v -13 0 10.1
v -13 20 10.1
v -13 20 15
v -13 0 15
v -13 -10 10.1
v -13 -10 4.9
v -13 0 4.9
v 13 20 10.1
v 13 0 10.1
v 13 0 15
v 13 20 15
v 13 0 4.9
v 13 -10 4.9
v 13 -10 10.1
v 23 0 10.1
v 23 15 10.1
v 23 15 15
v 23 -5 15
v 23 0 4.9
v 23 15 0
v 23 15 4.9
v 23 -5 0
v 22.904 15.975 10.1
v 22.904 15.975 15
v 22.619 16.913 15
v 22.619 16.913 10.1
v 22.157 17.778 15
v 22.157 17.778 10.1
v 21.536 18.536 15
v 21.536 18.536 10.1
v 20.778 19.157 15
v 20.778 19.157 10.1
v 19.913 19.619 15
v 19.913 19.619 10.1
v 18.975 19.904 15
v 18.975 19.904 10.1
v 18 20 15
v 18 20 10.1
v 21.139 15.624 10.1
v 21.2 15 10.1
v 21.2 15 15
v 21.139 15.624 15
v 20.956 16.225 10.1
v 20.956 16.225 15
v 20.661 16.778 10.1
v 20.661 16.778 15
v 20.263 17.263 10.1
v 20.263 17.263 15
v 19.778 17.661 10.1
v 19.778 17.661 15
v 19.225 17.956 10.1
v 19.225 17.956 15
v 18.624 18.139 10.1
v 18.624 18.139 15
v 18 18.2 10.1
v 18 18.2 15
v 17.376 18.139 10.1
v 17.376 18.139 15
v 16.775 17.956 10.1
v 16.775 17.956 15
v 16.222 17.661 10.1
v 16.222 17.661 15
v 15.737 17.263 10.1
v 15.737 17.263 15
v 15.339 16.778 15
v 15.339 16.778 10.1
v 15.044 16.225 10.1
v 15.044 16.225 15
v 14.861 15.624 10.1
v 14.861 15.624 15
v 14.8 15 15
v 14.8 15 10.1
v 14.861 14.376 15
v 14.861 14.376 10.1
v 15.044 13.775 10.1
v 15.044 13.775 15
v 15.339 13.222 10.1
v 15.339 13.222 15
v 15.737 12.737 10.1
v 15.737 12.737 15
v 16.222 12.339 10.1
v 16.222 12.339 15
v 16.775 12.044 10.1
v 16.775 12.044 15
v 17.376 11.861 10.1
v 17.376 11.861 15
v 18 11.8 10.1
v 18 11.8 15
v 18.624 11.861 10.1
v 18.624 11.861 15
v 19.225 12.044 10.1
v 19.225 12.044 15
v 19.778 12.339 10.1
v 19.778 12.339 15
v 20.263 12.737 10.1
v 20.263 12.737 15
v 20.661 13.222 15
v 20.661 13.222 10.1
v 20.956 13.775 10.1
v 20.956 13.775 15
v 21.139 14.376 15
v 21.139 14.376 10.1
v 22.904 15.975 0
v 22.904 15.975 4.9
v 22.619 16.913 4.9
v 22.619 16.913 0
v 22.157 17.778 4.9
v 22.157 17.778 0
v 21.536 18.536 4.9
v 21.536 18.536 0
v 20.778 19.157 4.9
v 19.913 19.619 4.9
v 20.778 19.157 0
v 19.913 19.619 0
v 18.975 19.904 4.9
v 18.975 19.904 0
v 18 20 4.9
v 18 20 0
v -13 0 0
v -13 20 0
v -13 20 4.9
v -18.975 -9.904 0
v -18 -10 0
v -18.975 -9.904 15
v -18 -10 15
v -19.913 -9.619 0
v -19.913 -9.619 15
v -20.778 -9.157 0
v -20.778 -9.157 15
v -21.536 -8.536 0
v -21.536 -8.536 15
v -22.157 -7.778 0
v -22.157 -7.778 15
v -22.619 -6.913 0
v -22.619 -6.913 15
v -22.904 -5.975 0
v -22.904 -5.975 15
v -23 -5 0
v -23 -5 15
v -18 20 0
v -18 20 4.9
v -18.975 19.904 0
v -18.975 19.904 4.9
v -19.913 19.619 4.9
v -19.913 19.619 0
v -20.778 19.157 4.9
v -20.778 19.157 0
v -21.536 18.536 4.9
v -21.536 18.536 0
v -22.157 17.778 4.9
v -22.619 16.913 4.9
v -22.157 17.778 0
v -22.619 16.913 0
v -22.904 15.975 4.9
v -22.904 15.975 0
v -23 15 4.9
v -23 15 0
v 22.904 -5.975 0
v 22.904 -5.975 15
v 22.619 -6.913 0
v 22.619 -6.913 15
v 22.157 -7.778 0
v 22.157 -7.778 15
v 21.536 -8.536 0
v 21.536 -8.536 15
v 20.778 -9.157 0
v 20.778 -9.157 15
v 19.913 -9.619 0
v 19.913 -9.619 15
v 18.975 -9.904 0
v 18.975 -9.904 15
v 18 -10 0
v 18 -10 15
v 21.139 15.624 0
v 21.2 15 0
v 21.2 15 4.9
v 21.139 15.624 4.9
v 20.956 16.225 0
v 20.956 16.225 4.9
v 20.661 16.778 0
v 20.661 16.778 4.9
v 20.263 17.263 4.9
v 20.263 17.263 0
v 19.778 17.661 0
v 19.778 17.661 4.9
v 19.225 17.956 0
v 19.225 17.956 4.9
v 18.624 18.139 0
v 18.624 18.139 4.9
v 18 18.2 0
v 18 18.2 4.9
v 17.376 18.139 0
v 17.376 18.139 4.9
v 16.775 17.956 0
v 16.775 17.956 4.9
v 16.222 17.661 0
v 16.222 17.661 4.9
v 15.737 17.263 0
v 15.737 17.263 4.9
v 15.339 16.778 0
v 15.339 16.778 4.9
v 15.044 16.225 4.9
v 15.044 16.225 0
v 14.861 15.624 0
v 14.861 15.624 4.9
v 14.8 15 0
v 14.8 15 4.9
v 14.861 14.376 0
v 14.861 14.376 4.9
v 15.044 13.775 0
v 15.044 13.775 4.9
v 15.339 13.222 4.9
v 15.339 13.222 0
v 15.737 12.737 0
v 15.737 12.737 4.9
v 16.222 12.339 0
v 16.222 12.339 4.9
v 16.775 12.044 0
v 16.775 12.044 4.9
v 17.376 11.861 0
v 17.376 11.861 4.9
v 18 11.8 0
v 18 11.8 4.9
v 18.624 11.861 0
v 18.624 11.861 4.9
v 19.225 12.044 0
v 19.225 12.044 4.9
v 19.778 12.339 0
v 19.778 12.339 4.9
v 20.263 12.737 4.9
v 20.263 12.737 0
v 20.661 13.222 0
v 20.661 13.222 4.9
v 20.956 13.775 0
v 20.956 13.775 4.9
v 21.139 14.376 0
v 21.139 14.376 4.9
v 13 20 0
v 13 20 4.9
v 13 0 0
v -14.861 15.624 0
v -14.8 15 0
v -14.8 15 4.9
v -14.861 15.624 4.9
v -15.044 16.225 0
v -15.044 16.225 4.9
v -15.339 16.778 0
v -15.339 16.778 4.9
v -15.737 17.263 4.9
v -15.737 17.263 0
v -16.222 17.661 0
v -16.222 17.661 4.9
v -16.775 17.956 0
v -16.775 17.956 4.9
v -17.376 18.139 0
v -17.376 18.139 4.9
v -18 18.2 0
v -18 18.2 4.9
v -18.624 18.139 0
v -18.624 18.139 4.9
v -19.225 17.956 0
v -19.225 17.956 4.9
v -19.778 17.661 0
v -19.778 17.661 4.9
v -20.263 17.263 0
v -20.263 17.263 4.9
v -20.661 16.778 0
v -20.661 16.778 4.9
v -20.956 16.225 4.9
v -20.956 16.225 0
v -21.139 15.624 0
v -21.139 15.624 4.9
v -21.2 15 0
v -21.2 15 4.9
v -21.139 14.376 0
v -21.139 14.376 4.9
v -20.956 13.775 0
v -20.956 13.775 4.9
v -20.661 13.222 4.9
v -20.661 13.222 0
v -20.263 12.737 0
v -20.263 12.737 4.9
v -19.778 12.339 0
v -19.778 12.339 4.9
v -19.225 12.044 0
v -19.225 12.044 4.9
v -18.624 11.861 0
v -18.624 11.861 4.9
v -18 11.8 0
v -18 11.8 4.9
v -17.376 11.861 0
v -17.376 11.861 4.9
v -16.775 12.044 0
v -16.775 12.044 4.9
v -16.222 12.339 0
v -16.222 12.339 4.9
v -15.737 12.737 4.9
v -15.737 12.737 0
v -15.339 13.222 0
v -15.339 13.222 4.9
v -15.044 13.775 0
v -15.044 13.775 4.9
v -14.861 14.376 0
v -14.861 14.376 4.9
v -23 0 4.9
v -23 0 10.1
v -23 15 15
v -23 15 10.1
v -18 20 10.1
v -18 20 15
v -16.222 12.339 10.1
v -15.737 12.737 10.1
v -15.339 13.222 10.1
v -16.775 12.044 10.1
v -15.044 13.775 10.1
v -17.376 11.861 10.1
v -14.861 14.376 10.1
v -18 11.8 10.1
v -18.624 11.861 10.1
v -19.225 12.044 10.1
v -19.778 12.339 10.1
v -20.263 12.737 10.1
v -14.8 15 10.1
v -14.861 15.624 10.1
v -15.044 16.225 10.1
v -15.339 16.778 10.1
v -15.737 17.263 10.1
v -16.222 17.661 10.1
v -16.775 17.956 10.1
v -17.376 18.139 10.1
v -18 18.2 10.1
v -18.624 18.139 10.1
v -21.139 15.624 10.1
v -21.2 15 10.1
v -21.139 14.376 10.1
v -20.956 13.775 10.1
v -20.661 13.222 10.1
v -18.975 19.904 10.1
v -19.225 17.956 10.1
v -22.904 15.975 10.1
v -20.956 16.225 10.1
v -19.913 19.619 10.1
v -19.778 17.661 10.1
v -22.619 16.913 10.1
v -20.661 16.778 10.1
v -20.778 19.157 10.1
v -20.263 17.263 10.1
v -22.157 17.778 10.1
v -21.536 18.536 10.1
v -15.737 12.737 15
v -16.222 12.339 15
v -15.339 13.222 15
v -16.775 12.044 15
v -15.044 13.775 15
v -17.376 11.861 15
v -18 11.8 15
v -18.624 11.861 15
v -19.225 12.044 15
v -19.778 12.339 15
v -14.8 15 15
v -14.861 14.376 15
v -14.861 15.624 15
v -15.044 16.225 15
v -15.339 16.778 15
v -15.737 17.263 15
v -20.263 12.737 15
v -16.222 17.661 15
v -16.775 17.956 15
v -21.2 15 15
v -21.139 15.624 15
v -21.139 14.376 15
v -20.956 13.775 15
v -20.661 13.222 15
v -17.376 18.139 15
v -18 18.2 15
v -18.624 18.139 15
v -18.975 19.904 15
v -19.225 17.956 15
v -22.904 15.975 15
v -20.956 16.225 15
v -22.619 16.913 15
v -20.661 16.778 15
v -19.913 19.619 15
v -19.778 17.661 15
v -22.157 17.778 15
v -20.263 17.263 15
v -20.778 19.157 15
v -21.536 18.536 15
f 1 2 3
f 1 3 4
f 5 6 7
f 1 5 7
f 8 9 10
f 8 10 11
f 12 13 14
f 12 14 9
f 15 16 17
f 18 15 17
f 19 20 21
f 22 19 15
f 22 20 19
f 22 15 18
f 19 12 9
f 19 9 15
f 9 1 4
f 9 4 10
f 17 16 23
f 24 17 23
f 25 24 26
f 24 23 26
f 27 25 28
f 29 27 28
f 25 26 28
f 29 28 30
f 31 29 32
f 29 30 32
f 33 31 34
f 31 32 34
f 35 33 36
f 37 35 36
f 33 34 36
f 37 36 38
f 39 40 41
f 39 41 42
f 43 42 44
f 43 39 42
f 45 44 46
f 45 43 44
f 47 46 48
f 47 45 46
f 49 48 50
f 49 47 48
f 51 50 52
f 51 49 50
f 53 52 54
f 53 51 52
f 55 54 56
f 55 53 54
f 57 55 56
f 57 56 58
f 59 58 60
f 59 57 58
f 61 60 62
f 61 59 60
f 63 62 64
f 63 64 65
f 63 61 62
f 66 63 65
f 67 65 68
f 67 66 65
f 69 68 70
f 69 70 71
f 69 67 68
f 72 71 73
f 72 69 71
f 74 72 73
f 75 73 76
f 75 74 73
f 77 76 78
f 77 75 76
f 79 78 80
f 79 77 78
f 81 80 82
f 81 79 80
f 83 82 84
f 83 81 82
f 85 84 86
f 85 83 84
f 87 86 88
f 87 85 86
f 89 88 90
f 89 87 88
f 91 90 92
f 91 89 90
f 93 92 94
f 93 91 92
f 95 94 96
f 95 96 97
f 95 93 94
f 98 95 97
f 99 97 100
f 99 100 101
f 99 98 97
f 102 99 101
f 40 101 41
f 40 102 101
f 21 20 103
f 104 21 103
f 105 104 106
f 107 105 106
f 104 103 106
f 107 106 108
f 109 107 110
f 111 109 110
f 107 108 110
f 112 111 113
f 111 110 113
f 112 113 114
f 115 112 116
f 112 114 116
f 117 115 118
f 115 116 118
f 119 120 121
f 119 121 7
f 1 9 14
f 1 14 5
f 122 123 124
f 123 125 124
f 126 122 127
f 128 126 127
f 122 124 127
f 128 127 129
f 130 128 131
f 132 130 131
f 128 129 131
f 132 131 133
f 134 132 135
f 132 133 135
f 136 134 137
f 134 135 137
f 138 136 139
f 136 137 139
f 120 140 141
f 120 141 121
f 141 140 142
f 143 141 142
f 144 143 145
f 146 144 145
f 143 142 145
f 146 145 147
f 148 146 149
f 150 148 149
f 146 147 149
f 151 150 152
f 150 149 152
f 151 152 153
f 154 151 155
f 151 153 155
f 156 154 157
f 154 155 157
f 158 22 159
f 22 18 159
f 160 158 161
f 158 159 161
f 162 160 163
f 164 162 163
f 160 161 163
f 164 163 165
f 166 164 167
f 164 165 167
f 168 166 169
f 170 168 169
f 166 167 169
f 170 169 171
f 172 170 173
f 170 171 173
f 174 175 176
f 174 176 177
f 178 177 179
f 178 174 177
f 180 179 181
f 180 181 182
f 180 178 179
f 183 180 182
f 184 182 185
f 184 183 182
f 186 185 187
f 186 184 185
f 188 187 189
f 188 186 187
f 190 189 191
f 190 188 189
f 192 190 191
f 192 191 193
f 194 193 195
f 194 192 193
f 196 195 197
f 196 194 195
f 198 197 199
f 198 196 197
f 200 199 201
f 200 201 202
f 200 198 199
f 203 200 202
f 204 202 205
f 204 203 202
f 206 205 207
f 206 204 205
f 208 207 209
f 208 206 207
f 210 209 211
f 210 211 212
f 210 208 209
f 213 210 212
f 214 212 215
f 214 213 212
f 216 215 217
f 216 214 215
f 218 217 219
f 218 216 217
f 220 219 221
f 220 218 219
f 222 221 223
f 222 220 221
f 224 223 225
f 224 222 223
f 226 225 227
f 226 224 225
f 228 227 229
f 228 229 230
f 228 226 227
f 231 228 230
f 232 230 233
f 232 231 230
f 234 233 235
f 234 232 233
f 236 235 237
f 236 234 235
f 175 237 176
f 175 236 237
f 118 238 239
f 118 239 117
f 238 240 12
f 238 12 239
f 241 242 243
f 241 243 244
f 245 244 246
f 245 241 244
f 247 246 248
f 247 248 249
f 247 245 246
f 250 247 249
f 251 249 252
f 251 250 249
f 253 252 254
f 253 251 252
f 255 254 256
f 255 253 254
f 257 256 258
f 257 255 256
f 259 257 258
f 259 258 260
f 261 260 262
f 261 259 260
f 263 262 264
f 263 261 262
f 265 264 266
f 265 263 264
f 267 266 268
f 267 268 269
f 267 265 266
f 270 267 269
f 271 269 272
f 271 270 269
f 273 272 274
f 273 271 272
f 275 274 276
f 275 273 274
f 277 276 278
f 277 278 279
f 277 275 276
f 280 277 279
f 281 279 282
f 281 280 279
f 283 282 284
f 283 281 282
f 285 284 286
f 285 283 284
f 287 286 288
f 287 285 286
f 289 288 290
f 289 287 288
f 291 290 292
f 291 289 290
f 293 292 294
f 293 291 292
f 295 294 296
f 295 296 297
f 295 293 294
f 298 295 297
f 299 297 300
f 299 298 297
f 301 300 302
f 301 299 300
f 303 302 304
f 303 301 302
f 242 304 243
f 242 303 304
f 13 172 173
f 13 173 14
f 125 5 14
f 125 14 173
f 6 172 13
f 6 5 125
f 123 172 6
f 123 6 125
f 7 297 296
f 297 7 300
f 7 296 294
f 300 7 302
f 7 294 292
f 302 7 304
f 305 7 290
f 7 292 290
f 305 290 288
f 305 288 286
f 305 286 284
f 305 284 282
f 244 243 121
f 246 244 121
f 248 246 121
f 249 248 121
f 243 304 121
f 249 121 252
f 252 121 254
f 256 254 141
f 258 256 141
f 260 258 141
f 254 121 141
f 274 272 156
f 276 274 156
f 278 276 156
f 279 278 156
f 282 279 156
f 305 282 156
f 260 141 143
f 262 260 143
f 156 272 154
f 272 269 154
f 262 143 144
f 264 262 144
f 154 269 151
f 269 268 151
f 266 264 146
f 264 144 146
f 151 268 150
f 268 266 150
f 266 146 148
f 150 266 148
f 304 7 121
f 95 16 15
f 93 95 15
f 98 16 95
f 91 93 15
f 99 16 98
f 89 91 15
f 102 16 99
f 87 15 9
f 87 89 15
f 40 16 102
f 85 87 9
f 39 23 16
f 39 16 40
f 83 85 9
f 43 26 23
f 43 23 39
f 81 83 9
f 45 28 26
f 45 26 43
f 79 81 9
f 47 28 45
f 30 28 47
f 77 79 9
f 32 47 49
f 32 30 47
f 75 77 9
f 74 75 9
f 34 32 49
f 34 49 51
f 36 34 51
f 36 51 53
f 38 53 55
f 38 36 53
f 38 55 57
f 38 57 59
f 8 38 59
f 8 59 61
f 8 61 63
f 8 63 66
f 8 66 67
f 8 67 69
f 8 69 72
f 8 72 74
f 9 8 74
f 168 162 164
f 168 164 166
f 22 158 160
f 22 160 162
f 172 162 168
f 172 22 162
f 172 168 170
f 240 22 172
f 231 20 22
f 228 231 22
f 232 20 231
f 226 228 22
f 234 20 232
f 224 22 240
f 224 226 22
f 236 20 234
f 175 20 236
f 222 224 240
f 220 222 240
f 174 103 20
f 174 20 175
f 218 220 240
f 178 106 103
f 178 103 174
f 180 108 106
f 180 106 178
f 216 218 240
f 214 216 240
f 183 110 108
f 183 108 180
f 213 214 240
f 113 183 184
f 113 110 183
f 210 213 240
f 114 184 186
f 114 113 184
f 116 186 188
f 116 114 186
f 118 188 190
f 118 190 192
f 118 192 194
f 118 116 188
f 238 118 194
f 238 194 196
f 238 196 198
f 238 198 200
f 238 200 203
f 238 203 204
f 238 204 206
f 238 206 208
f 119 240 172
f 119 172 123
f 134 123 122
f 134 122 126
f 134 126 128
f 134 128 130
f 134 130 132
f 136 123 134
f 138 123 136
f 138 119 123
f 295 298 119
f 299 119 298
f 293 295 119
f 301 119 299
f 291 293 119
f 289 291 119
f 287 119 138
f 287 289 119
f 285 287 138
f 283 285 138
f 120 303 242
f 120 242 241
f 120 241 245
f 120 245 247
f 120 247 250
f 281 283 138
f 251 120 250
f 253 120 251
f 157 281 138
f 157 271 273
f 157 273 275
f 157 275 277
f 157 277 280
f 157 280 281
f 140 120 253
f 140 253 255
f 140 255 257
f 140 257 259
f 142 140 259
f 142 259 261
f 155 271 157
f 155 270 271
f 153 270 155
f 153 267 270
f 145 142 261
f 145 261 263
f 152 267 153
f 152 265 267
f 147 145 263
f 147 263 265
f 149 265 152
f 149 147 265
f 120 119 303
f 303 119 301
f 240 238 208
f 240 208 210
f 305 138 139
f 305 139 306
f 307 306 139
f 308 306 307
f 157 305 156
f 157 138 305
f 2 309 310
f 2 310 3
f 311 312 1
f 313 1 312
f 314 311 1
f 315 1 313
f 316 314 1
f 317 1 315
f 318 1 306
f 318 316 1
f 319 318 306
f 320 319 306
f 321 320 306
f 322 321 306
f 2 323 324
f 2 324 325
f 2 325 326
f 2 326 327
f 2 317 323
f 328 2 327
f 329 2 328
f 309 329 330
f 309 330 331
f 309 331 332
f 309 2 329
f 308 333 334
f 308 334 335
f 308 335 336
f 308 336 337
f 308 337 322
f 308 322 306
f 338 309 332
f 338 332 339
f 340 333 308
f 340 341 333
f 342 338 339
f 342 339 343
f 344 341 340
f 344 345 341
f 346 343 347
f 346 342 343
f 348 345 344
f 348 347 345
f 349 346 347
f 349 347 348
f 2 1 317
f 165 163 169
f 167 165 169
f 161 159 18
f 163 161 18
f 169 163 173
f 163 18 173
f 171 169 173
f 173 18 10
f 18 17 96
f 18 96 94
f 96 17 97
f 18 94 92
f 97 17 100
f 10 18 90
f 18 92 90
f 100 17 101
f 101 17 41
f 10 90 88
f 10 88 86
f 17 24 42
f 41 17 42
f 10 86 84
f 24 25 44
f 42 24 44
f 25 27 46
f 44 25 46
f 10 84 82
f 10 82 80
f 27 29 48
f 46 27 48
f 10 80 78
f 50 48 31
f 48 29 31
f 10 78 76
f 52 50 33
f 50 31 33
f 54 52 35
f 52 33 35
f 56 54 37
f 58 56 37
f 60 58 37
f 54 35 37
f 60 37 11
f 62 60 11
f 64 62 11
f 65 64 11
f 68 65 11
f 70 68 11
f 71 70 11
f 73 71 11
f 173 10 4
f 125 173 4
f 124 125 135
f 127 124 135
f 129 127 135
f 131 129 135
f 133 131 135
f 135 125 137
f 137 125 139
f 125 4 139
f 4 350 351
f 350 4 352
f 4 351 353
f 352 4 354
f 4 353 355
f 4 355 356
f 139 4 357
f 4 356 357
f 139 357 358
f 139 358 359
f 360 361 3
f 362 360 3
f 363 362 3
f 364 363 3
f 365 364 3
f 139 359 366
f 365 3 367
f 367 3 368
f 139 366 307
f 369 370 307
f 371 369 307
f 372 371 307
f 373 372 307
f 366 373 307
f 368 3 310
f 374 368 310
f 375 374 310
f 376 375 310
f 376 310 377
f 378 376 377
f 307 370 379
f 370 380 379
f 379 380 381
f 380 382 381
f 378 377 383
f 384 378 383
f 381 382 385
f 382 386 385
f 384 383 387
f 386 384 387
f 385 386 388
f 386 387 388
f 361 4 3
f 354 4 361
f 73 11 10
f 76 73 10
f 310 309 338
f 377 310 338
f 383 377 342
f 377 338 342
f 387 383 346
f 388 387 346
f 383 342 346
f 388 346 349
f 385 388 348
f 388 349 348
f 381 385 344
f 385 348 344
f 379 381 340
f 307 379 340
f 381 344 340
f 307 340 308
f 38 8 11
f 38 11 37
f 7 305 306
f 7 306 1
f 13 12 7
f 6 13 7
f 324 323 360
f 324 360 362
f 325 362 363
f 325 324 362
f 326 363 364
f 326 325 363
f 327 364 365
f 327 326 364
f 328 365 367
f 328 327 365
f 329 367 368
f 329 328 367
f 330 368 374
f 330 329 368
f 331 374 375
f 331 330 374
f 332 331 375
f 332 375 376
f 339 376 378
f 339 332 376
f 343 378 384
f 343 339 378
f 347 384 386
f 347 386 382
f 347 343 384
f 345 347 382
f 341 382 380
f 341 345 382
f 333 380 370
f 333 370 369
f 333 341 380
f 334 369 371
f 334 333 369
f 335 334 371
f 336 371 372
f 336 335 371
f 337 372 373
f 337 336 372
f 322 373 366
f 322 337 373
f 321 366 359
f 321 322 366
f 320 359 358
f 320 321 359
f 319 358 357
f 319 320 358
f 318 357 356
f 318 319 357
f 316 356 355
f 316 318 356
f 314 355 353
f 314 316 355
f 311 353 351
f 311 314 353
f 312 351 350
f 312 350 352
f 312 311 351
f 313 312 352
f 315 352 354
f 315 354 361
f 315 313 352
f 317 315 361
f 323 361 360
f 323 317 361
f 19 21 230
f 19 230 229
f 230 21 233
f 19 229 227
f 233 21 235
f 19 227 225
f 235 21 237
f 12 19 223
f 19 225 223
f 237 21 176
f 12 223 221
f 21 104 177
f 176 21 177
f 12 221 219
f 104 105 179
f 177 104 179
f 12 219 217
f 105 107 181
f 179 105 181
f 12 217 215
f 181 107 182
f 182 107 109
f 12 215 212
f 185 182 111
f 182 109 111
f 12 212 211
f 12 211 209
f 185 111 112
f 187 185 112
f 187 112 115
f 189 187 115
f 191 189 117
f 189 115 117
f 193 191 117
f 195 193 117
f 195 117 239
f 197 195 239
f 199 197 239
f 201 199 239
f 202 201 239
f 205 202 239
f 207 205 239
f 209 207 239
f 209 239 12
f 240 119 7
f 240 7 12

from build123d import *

# Parameters (mm, degrees)
SKETCH006_R  = 3.2
PAD004_DEPTH = 4.9
SKETCH007_W  = 10
SKETCH007_H  = 10
PAD005_DEPTH = 5.2
SKETCH010_R  = 3.2
PAD006_DEPTH = 4.9
FILLET005_R  = 5


with BuildPart() as part:
    # Sketch006 → Pad004 (new body)
    with BuildSketch(Plane.XY):
        with BuildLine():
            Line((-18, 20), (-13, 20))
            Line((-13, 20), (-13, 0))
            Line((-13, 0), (13, 0))
            Line((13, 0), (13, 20))
            Line((13, 20), (18, 20))
            ThreePointArc((23, 15), (21.535534, 18.535534), (18, 20))
            Line((23, 15), (23, -10))
            Line((23, -10), (-23, -10))
            Line((-23, -10), (-23, 15))
            ThreePointArc((-18, 20), (-21.535534, 18.535534), (-23, 15))
        make_face()
        with Locations((-18, 15)):
            Circle(SKETCH006_R, mode=Mode.SUBTRACT)
        with Locations((18, 15)):
            Circle(SKETCH006_R, mode=Mode.SUBTRACT)
    extrude(amount=PAD004_DEPTH)

    # Sketch007 → Pad005 (new body)
    with BuildSketch(Plane.XY.offset(4.9)):
        with Locations((-18, -5)):
            Rectangle(SKETCH007_W, SKETCH007_H)
        with Locations((18, -5)):
            Rectangle(SKETCH007_W, SKETCH007_H)
    extrude(amount=PAD005_DEPTH)

    # Sketch010 → Pad006 (new body)
    with BuildSketch(Plane.XY.offset(10.1)):
        with BuildLine():
            Line((-18, 20), (-13, 20))
            Line((-13, 20), (-13, 0))
            Line((-13, 0), (13, 0))
            Line((13, 0), (13, 20))
            Line((13, 20), (18, 20))
            ThreePointArc((23, 15), (21.535534, 18.535534), (18, 20))
            Line((23, 15), (23, -10))
            Line((23, -10), (-23, -10))
            Line((-23, -10), (-23, 15))
            ThreePointArc((-18, 20), (-21.535534, 18.535534), (-23, 15))
        make_face()
        with Locations((-18, 15)):
            Circle(SKETCH010_R, mode=Mode.SUBTRACT)
        with Locations((18, 15)):
            Circle(SKETCH010_R, mode=Mode.SUBTRACT)
    extrude(amount=PAD006_DEPTH)

    # Fillet005
    fillet005_edges = [part.edges().sort_by_distance(p)[0] for p in [
        (23, -10, 12.55),
        (23, -10, 7.5),
        (23, -10, 2.45),
        (-23, -10, 2.45),
        (-23, -10, 7.5),
        (-23, -10, 12.55),
    ]]
    fillet(fillet005_edges, radius=FILLET005_R)


solid = part.part
